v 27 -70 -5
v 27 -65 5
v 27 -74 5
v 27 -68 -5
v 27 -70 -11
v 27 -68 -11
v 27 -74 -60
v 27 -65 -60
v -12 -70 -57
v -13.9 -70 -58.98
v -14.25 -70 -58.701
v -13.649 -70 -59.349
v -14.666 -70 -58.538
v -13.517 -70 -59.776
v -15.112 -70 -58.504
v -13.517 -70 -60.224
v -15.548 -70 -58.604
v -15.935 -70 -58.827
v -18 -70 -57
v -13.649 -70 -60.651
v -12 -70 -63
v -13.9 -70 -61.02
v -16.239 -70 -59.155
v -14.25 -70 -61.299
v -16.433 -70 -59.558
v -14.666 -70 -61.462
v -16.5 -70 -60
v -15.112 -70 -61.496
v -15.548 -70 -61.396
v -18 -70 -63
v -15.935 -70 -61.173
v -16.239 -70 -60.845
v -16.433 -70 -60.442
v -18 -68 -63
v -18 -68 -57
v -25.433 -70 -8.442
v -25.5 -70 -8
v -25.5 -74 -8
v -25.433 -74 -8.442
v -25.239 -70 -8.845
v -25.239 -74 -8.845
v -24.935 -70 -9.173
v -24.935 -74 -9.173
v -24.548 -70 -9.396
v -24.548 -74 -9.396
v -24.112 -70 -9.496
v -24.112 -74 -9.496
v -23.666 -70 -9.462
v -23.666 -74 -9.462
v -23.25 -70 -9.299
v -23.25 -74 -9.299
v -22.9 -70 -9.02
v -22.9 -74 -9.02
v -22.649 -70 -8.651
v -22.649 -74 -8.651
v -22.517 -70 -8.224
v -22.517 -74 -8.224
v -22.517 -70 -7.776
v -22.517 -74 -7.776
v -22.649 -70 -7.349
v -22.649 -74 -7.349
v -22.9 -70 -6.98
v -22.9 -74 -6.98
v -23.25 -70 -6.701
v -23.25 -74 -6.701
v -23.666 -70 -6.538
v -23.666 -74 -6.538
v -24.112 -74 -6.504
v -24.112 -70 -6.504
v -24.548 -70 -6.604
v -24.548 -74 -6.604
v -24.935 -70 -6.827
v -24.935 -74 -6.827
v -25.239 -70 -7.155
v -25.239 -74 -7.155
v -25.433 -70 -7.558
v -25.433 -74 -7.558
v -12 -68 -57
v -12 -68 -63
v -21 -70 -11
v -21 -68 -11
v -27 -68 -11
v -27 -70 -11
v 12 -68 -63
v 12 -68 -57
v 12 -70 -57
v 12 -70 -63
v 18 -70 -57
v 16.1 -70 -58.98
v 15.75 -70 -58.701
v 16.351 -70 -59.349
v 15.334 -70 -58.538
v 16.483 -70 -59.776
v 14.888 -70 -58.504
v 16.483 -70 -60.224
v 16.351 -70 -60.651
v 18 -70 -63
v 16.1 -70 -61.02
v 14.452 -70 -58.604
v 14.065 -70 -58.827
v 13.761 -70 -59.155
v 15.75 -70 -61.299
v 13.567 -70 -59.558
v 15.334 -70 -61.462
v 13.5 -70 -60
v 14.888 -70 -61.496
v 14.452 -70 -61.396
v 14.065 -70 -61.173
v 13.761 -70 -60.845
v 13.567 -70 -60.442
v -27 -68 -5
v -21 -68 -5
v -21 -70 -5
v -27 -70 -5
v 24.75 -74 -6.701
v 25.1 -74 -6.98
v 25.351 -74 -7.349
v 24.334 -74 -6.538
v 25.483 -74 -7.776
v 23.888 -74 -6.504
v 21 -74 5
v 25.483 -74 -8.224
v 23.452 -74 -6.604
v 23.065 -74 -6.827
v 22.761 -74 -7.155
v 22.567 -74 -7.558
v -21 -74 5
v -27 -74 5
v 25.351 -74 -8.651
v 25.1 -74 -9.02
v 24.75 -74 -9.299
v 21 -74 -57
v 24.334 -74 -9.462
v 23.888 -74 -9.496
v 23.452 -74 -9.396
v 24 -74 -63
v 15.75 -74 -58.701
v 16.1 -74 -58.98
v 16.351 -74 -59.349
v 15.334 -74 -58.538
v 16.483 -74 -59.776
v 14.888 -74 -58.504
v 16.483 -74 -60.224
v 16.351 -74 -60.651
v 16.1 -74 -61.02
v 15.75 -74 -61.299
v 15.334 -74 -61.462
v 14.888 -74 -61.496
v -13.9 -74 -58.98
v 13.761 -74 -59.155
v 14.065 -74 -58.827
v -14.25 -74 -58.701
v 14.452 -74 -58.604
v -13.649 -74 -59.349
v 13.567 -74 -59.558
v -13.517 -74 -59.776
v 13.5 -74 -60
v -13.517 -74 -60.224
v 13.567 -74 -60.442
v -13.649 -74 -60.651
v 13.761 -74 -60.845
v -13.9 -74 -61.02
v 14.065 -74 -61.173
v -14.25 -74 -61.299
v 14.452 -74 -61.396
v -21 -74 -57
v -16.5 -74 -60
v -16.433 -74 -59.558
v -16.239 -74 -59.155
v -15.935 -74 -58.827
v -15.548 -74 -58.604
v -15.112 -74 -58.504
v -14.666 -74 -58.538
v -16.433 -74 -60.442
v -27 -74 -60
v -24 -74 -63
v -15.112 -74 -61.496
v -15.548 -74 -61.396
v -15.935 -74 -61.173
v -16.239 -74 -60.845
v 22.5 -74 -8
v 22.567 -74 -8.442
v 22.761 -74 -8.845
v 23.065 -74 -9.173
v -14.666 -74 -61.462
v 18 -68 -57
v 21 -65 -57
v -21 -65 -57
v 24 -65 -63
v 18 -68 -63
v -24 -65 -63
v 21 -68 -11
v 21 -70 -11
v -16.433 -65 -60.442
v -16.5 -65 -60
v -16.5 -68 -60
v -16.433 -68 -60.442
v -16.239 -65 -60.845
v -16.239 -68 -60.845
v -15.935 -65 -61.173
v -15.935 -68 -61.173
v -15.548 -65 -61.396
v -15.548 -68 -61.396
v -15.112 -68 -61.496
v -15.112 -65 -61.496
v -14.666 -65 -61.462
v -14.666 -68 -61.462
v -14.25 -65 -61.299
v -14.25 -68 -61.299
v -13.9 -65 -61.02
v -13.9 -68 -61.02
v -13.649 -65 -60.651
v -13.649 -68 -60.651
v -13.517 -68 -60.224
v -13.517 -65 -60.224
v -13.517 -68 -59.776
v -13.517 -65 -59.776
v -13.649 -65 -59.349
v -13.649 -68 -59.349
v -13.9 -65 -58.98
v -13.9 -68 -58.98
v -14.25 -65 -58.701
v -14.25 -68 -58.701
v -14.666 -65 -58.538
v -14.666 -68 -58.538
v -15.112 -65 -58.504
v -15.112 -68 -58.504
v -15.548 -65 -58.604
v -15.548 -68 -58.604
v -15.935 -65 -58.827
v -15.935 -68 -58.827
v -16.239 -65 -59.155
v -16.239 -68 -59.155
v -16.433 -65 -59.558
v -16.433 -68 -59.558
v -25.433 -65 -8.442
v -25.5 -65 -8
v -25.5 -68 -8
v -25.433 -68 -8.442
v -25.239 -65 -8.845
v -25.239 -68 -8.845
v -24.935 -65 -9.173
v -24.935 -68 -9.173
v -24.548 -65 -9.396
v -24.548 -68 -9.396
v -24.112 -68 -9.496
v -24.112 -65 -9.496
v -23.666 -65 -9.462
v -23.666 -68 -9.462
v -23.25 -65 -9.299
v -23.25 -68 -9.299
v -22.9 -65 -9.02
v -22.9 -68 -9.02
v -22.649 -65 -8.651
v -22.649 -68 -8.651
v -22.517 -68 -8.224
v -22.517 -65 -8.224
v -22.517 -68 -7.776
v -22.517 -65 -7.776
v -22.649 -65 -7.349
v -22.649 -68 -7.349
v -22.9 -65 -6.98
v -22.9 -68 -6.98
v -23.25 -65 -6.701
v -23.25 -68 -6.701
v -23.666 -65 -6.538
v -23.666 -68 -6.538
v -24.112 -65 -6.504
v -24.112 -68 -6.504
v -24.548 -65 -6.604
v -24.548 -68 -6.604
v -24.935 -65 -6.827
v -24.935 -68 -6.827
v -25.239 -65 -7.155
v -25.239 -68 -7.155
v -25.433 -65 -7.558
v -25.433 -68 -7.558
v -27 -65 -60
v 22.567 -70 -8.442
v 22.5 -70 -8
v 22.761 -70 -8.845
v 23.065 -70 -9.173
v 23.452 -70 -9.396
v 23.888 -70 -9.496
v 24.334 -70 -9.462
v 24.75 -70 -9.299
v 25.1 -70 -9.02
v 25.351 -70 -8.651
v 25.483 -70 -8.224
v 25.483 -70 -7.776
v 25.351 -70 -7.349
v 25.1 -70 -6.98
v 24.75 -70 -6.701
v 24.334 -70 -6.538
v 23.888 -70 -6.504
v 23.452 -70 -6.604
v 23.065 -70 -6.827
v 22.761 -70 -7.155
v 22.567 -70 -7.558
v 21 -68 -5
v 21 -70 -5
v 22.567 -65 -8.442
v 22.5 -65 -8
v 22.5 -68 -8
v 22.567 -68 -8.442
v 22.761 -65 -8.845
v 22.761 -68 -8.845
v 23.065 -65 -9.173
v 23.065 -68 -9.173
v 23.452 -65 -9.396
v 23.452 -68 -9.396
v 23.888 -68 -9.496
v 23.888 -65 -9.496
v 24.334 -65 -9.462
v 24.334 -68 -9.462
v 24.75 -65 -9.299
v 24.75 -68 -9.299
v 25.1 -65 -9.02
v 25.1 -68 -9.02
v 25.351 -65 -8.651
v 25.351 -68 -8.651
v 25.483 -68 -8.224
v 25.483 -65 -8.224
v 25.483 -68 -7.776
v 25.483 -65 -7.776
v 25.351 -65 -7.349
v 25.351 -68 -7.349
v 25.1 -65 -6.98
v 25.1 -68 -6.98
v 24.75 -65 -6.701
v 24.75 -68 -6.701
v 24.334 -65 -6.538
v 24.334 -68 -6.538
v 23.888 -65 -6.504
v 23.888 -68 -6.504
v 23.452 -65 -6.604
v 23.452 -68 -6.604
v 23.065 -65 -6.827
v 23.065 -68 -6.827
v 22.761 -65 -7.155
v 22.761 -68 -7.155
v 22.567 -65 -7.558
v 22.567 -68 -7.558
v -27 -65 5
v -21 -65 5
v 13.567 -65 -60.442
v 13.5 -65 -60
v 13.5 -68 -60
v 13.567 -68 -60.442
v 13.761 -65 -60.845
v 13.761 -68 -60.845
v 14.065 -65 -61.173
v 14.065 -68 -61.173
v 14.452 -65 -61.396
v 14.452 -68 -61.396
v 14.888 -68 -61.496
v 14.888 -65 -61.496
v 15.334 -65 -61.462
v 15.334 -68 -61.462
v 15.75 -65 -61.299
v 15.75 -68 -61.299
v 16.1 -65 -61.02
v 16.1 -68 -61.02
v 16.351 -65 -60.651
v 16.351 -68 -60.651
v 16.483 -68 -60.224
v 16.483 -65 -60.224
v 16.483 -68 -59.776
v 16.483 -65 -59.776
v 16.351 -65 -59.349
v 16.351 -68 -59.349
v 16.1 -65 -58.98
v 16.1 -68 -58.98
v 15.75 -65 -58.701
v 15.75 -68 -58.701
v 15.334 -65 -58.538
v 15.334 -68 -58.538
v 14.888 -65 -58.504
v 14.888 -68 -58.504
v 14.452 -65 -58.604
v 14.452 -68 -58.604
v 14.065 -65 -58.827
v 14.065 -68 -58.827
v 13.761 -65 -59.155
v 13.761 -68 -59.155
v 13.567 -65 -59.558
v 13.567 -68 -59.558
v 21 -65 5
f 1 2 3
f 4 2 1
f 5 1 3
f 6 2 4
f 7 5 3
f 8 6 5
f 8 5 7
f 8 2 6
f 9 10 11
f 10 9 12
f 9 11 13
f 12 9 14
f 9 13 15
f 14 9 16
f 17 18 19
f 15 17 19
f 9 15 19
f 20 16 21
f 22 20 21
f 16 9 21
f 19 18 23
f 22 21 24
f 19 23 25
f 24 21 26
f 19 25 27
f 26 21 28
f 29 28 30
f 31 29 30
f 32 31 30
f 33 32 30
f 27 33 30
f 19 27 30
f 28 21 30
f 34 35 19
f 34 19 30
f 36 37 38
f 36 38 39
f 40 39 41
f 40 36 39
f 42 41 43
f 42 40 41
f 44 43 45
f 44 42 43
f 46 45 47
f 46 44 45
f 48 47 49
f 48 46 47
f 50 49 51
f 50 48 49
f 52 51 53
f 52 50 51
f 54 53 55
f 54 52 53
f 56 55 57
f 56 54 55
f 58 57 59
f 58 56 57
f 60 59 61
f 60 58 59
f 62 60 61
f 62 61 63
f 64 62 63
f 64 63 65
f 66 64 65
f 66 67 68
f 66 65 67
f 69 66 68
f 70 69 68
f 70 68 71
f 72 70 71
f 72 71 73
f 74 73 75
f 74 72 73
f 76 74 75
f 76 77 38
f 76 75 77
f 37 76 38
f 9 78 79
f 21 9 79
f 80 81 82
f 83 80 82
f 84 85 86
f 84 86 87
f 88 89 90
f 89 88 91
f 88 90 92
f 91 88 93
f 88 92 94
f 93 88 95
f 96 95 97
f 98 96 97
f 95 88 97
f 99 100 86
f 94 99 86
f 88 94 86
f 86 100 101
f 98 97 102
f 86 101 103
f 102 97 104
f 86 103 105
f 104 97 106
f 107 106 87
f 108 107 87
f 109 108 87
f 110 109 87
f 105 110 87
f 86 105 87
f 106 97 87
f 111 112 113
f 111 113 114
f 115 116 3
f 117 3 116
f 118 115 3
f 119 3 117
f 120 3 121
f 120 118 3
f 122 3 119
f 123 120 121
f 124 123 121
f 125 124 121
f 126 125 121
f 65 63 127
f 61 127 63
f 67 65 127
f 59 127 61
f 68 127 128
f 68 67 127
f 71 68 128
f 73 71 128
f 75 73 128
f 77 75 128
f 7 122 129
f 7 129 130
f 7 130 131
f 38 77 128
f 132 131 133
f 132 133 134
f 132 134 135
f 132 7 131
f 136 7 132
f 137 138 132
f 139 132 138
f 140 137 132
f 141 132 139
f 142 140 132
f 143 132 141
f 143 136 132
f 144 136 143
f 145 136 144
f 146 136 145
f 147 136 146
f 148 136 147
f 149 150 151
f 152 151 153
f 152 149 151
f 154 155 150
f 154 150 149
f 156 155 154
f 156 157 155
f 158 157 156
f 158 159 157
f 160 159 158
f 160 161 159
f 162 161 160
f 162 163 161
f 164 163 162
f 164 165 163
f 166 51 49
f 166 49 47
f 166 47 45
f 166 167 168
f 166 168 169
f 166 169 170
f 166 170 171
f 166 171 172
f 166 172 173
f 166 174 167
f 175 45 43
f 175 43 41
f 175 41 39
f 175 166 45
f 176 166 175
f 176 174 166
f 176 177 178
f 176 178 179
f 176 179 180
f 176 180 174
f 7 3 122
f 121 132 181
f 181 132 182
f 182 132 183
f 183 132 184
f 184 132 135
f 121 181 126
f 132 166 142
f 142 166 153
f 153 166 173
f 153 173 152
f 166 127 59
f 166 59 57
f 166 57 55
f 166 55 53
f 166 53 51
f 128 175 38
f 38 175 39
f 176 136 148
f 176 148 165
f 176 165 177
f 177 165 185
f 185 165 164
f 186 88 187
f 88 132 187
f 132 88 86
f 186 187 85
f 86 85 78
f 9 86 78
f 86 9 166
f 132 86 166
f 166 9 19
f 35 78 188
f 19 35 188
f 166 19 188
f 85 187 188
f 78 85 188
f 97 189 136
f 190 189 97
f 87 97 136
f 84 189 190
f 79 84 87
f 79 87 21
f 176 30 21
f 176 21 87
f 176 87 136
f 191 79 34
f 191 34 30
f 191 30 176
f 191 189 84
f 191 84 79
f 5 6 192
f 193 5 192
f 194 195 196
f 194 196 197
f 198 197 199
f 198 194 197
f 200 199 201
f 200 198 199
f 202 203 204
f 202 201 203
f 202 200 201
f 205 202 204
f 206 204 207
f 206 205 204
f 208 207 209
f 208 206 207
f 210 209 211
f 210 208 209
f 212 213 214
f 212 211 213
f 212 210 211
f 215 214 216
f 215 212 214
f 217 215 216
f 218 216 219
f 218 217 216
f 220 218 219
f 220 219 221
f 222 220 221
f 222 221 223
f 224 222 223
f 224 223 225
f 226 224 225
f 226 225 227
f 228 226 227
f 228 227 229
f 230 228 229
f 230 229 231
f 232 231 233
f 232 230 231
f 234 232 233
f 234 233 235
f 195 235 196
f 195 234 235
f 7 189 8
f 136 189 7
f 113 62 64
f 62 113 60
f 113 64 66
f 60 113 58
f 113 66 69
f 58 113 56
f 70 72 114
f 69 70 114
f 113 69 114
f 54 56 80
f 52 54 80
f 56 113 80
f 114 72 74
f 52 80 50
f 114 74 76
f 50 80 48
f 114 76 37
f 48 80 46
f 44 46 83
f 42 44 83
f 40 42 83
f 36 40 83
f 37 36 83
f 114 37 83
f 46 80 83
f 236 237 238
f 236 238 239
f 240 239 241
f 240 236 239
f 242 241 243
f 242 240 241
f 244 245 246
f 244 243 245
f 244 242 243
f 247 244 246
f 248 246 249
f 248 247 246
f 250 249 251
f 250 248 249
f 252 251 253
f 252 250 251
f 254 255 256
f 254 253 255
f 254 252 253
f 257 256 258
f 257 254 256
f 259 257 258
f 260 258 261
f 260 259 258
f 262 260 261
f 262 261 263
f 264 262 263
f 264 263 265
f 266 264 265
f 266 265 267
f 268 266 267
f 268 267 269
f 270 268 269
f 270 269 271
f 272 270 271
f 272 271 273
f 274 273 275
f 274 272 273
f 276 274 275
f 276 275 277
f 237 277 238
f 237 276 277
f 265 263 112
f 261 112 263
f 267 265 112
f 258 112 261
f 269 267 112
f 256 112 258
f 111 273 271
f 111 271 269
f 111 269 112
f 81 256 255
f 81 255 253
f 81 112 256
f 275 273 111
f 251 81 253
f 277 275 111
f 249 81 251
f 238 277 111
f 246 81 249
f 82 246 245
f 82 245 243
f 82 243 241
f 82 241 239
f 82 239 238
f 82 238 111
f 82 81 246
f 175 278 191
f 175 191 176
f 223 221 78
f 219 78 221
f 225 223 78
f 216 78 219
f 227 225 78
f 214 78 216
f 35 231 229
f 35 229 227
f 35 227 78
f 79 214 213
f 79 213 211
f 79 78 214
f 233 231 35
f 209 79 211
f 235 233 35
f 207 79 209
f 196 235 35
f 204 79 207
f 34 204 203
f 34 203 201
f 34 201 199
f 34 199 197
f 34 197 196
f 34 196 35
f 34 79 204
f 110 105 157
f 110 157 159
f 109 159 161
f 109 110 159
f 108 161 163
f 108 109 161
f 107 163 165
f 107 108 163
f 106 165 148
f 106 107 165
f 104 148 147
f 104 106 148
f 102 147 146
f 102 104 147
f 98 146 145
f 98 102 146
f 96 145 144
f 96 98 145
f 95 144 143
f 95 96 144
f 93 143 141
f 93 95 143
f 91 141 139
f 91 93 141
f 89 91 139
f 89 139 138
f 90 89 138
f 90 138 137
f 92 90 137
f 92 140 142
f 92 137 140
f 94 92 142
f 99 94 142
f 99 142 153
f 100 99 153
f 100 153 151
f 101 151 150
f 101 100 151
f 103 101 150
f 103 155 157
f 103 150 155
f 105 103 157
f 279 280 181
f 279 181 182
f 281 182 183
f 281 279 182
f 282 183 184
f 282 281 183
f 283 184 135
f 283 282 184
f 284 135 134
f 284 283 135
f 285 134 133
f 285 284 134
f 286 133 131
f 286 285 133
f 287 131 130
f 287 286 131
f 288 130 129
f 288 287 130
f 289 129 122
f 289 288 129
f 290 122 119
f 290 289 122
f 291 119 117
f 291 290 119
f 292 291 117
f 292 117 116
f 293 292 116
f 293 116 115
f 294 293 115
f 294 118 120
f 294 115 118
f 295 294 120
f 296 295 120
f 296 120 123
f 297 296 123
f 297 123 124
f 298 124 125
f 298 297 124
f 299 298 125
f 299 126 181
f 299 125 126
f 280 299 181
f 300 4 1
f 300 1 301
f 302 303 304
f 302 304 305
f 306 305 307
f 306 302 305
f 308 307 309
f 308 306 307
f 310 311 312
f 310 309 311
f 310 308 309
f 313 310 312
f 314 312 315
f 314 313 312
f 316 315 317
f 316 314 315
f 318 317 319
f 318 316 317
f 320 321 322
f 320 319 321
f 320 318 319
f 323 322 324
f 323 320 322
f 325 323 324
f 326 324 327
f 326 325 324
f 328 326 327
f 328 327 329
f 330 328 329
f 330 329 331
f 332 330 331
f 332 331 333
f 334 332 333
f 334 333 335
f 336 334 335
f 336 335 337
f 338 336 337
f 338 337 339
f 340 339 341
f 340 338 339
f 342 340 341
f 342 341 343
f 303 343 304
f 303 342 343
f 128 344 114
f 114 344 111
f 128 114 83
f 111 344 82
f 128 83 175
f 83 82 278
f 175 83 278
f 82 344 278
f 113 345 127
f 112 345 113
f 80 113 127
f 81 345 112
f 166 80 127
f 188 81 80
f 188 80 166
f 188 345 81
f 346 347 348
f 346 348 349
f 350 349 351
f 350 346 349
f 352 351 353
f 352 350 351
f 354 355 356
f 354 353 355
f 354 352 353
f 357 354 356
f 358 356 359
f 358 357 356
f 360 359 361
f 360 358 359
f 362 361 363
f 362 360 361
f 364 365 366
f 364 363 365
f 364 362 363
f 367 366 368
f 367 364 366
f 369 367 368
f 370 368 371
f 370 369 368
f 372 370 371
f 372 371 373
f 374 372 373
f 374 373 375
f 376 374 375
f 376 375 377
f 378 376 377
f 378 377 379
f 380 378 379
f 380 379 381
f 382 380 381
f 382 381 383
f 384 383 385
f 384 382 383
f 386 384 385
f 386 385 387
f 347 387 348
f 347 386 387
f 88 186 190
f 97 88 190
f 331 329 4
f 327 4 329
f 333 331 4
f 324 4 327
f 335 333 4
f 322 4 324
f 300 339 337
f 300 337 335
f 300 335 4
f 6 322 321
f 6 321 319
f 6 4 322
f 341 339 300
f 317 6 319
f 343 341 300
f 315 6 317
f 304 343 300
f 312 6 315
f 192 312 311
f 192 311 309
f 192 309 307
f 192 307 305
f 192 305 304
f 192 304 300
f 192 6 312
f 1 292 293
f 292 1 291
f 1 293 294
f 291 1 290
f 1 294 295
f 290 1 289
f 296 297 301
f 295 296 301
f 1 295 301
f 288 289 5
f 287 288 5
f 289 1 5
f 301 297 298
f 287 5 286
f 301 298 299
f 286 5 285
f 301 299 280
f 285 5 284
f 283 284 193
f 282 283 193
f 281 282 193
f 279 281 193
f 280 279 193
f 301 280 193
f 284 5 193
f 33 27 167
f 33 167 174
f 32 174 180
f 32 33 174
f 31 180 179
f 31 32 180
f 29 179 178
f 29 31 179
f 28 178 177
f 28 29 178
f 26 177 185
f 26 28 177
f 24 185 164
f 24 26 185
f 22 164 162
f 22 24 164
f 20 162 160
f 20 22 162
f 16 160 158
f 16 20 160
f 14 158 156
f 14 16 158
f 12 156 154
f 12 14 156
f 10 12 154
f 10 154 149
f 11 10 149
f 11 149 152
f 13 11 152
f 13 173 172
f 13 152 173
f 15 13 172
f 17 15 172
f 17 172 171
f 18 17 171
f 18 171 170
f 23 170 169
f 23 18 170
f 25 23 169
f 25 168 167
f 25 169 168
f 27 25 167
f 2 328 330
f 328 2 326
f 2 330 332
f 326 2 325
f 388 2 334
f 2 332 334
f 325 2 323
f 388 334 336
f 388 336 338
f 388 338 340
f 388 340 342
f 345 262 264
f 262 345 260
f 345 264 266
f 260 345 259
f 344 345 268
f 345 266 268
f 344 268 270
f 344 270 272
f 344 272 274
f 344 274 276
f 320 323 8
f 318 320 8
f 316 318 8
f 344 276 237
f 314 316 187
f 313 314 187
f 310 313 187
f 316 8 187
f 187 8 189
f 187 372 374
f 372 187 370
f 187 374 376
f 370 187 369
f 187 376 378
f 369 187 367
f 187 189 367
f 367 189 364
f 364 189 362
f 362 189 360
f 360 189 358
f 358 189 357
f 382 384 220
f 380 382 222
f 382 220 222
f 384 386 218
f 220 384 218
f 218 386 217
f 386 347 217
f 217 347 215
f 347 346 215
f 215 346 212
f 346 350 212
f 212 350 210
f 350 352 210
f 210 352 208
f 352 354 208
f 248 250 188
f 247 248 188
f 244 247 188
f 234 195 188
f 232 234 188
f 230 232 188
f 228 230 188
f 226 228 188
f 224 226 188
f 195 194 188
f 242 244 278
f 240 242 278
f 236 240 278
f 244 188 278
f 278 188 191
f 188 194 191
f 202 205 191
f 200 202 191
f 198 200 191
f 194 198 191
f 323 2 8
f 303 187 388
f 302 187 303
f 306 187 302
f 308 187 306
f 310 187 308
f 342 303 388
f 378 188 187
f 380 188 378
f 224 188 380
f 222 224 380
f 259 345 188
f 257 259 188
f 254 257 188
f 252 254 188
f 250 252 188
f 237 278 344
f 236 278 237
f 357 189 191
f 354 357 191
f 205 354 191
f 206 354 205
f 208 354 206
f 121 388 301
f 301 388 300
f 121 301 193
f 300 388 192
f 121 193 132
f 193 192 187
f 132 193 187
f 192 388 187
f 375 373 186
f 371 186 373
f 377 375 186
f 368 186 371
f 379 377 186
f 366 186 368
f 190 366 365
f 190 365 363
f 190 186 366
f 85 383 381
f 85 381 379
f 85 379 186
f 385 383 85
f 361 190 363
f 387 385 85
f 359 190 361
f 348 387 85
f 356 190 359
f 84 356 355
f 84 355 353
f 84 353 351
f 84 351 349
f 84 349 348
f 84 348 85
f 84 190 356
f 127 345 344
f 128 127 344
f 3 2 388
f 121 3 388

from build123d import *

# Parameters (mm, degrees)
BOX905_W               = 6
BOX905_H               = 6
BOX905_DEPTH           = 2
BOX906_W               = 6
BOX906_H               = 6
BOX906_DEPTH           = 2
BOX907_W               = 6
BOX907_H               = 6
BOX907_DEPTH           = 2
BOX904_W               = 7
BOX904_H               = 6
BOX904_DEPTH           = 2
CYLINDER2651_R         = 1.5
CYLINDER2651_DEPTH     = 60
CYLINDER2652_R         = 1.5
CYLINDER2652_DEPTH     = 60
CYLINDER2653_R         = 1.5
CYLINDER2653_DEPTH     = 60
CYLINDER2650_R         = 1.5
CYLINDER2650_DEPTH     = 60
BOX894_W               = 42
BOX894_H               = 64
BOX894_DEPTH           = 50
BOX893_W               = 54
BOX893_H               = 68
BOX893_DEPTH           = 9
CHAMFER127_SIZE        = 3
CUT989_ROLL_ANGLE      = -90
CUT989_PLACEMENT_ANGLE = 180


with BuildPart() as krychle904:
    # Box905 → Box905 (new body)
    with BuildSketch(Plane(origin=(-18, 122, -48), x_dir=(1, 0, 0), z_dir=(0, 0, 1))):
        with Locations((3, 3)):
            Rectangle(BOX905_W, BOX905_H)
    extrude(amount=BOX905_DEPTH)


with BuildPart() as krychle905:
    # Box906 → Box906 (new body)
    with BuildSketch(Plane(origin=(21, 70, -48), x_dir=(1, 0, 0), z_dir=(0, 0, 1))):
        with Locations((3, 3)):
            Rectangle(BOX906_W, BOX906_H)
    extrude(amount=BOX906_DEPTH)


with BuildPart() as krychle906:
    # Box907 → Box907 (new body)
    with BuildSketch(Plane(origin=(12, 122, -48), x_dir=(1, 0, 0), z_dir=(0, 0, 1))):
        with Locations((3, 3)):
            Rectangle(BOX907_W, BOX907_H)
    extrude(amount=BOX907_DEPTH)


with BuildPart() as compound1179:
    # Box904 → Box904 (new body)
    with BuildSketch(Plane(origin=(-28, 70, -48), x_dir=(1, 0, 0), z_dir=(0, 0, 1))):
        with Locations((3.5, 3)):
            Rectangle(BOX904_W, BOX904_H)
    extrude(amount=BOX904_DEPTH)

    # Compound1179: union Krychle904, Krychle905, Krychle906
    add(krychle904.part)
    add(krychle905.part)
    add(krychle906.part)


with BuildPart() as compound1179_1:
    # Compound1179 placement: moved
    add(compound1179.part.moved(Location((0, 0, 118))))


with BuildPart() as v_lec2621:
    # Cylinder2651 → Cylinder2651 (new body)
    with BuildSketch(Plane(origin=(-24, 73, -80), x_dir=(1, 0, 0), z_dir=(0, 0, 1))):
        Circle(CYLINDER2651_R)
    extrude(amount=CYLINDER2651_DEPTH)


with BuildPart() as v_lec2622:
    # Cylinder2652 → Cylinder2652 (new body)
    with BuildSketch(Plane(origin=(-15, 125, -80), x_dir=(1, 0, 0), z_dir=(0, 0, 1))):
        Circle(CYLINDER2652_R)
    extrude(amount=CYLINDER2652_DEPTH)


with BuildPart() as v_lec2623:
    # Cylinder2653 → Cylinder2653 (new body)
    with BuildSketch(Plane(origin=(15, 125, -80), x_dir=(1, 0, 0), z_dir=(0, 0, 1))):
        Circle(CYLINDER2653_R)
    extrude(amount=CYLINDER2653_DEPTH)


with BuildPart() as compound1172:
    # Cylinder2650 → Cylinder2650 (new body)
    with BuildSketch(Plane(origin=(24, 73, -80), x_dir=(1, 0, 0), z_dir=(0, 0, 1))):
        Circle(CYLINDER2650_R)
    extrude(amount=CYLINDER2650_DEPTH)

    # Compound1172: union Válec2621, Válec2622, Válec2623
    add(v_lec2621.part)
    add(v_lec2622.part)
    add(v_lec2623.part)


with BuildPart() as compound1172_1:
    # Compound1172 placement: moved
    add(compound1172.part.moved(Location((0, 0, 120))))


with BuildPart() as krychle893:
    # Box894 → Box894 (new body)
    with BuildSketch(Plane(origin=(-21, 58, 40), x_dir=(1, 0, 0), z_dir=(0, 0, 1))):
        with Locations((21, 32)):
            Rectangle(BOX894_W, BOX894_H)
    extrude(amount=BOX894_DEPTH)


with BuildPart() as cut989:
    # Box893 → Box893 (new body)
    with BuildSketch(Plane(origin=(-27, 60, 76), x_dir=(1, 0, 0), z_dir=(0, 0, 1))):
        with Locations((27, 34)):
            Rectangle(BOX893_W, BOX893_H)
    extrude(amount=BOX893_DEPTH)

    # Cut978: cut Krychle893
    add(krychle893.part, mode=Mode.SUBTRACT)


with BuildPart() as cut989_1:
    # Cut978 placement: moved
    add(cut989.part.moved(Location((0, 0, -9))))

    # Chamfer127
    chamfer127_edges = [cut989_1.edges().sort_by_distance(p)[0] for p in [
        (-27, 128, 71.5),
        (27, 128, 71.5),
    ]]
    chamfer(chamfer127_edges, length=CHAMFER127_SIZE)

    # Cut979: cut Compound1172
    add(compound1172_1.part, mode=Mode.SUBTRACT)

    # Cut989: cut Compound1179
    add(compound1179_1.part, mode=Mode.SUBTRACT)


with BuildPart() as cut989_2:
    # Cut989 roll: moved
    add(cut989_1.part.rotate(Axis((0, 0, 0), (1, 0, 0)), CUT989_ROLL_ANGLE))


with BuildPart() as cut989_3:
    # Cut989 placement: moved
    add(cut989_2.part.moved(Location((0, 2, 65))).rotate(Axis((0, 2, 65), (0, 0, 1)), CUT989_PLACEMENT_ANGLE))


solid = cut989_3.part
